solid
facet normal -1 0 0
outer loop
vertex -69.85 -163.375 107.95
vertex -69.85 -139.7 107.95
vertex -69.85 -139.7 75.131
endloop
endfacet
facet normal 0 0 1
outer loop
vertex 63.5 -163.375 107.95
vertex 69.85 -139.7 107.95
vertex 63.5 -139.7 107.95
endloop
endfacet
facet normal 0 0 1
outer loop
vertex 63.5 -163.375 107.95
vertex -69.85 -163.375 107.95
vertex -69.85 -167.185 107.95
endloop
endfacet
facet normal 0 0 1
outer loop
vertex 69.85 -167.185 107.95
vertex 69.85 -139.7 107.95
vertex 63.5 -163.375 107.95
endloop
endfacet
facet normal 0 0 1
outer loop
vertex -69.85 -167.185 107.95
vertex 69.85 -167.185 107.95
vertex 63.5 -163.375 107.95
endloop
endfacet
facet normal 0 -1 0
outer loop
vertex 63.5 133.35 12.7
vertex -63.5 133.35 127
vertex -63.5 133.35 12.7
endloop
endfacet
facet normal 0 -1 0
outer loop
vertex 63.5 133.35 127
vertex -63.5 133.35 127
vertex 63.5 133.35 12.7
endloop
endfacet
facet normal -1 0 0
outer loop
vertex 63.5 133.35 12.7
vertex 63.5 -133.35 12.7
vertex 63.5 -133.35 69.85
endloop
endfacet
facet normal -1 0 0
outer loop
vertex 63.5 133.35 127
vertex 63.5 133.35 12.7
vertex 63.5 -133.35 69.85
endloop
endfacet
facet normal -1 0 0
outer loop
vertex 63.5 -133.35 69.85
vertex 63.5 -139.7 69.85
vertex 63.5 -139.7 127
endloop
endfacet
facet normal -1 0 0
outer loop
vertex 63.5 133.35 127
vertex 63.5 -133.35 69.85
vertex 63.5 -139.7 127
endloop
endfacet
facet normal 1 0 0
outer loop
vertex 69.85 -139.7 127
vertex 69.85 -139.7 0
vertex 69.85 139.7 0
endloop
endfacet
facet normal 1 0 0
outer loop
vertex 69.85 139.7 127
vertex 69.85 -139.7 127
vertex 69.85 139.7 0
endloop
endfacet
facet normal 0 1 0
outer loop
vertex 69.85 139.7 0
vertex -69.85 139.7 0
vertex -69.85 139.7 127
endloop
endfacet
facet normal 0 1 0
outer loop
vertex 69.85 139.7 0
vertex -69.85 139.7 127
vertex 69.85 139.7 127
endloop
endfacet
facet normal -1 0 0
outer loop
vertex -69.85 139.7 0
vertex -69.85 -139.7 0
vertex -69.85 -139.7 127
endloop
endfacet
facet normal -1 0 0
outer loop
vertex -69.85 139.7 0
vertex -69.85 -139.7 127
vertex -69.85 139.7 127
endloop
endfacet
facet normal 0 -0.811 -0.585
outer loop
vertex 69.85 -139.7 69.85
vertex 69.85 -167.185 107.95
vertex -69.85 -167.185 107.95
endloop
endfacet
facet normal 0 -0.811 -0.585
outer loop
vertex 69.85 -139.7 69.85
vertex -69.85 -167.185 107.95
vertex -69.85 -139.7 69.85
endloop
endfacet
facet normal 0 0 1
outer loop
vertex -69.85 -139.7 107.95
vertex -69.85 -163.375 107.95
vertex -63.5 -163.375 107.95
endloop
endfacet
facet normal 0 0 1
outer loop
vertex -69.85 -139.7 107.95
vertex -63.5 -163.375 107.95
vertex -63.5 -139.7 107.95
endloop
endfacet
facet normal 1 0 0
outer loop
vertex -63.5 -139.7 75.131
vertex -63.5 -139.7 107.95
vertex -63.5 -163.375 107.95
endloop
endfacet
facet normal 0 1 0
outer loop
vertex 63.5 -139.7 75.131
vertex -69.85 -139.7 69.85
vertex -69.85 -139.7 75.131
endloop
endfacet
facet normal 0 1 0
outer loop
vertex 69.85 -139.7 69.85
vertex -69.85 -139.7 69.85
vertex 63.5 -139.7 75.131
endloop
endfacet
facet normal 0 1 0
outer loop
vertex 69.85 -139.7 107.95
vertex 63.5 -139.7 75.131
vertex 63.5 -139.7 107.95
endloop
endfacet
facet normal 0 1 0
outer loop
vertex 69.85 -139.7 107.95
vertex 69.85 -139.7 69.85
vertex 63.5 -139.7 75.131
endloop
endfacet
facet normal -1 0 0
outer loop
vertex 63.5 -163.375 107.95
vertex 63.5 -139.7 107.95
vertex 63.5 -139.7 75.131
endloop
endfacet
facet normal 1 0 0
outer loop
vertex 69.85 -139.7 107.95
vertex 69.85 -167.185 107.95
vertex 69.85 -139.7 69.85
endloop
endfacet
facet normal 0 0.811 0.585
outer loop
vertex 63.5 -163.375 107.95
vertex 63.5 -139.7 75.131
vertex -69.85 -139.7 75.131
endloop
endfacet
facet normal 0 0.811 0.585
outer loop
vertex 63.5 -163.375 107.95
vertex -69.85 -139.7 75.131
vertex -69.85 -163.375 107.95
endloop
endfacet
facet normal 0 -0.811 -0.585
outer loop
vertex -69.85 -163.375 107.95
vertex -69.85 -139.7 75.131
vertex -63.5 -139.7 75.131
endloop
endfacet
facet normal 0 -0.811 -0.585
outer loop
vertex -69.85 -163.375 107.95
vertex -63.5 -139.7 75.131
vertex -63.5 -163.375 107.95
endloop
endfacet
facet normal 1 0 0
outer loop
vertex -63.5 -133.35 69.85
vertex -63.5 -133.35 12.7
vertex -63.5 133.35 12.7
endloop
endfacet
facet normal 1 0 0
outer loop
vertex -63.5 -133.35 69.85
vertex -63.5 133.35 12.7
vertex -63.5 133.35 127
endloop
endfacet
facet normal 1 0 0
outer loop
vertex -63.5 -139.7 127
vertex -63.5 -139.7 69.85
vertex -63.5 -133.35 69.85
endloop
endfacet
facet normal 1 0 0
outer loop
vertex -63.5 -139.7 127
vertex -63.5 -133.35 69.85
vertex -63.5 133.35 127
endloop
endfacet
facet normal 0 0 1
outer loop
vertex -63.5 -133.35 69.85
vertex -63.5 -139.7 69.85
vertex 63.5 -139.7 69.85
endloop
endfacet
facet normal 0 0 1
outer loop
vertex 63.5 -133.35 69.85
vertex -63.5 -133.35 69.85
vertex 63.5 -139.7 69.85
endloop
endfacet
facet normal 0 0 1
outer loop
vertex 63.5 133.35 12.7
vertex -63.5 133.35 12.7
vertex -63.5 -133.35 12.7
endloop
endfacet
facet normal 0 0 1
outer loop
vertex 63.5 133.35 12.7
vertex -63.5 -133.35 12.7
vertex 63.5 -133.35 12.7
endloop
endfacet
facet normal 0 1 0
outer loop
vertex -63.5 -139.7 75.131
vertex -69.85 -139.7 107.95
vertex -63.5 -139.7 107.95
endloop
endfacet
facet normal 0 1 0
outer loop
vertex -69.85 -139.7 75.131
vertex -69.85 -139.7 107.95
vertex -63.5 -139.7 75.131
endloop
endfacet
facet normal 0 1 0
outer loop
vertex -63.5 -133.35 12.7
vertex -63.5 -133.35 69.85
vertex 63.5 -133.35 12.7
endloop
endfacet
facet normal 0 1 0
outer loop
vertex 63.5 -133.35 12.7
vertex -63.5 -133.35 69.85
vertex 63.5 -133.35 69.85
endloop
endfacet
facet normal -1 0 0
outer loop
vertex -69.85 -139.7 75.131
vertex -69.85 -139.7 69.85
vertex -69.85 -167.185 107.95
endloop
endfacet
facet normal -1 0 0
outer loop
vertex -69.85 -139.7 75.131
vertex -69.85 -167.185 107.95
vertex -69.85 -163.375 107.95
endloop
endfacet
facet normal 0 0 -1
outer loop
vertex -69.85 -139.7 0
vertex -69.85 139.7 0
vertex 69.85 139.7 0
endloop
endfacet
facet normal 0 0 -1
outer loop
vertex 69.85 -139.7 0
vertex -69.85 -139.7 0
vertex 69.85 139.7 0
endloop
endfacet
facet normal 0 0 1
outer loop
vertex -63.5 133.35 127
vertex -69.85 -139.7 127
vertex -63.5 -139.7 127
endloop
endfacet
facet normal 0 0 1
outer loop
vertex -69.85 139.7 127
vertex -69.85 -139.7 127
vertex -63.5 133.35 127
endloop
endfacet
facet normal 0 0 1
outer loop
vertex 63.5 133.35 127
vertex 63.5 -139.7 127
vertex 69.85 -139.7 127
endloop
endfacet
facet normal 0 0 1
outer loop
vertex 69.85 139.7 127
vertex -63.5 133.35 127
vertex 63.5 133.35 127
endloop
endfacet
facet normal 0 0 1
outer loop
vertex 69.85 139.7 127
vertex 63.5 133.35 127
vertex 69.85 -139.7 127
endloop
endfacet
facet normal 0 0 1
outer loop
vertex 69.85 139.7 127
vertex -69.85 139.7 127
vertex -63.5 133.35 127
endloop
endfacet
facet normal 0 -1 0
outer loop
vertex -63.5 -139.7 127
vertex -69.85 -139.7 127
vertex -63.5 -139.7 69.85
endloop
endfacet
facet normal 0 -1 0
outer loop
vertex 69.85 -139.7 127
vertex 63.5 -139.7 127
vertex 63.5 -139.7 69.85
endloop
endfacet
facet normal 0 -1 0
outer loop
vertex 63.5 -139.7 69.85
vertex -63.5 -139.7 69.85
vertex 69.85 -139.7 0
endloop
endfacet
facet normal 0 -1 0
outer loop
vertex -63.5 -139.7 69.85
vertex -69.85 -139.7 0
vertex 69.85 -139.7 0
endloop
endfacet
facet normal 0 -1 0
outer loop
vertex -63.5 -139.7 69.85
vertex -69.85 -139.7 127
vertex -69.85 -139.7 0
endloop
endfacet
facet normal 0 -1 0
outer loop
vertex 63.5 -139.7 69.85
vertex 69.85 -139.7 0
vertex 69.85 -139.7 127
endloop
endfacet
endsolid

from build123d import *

# Parameters (mm, degrees)
F0_W      = 139.7
F0_H      = 279.4
F1_DEPTH  = 127
F2_W      = 127
F2_H      = 266.7
F3_DEPTH  = 114.3
F4_W      = 127
F4_H      = 57.15
F5_DEPTH  = 25.4
F7_DEPTH  = 139.7
F9_DEPTH  = 133.35
F11_DEPTH = 6.35
F12_DEPTH = 6.35


with BuildPart() as f1:
    # F0 (on Top) → F1 (new body)
    with BuildSketch(Plane.XY):
        Rectangle(F0_W, F0_H)
    extrude(amount=F1_DEPTH)

    # F2 (on face) → F3 (cut)
    with BuildSketch(Plane.XY.offset(127)):
        Rectangle(F2_W, F2_H)
    extrude(amount=-F3_DEPTH, mode=Mode.SUBTRACT)

    # F4 (on face) → F5 (cut)
    with BuildSketch(Plane.XZ.offset(139.7)):
        with Locations((0, 98.425)):
            Rectangle(F4_W, F4_H)
    extrude(amount=-F5_DEPTH, mode=Mode.SUBTRACT)


with BuildPart() as f7:
    # F6 (on face) → F7 (new body)
    with BuildSketch(Plane.YZ.offset(69.85)):
        Polygon((-139.7, 69.85), (-139.7, 107.95), (-167.185268, 107.95), align=None)
    extrude(amount=-F7_DEPTH)

    # F8 (on face) → F9 (cut)
    with BuildSketch(Plane(origin=(-69.85, 0, 0), x_dir=(0, -1, 0), z_dir=(-1, 0, 0))):
        Polygon((163.375268, 107.95), (139.7, 107.95), (139.7, 75.131411), align=None)
    extrude(amount=-F9_DEPTH, mode=Mode.SUBTRACT)


with BuildPart() as f11:
    # F10 (on face) → F11 (new body)
    with BuildSketch(Plane(origin=(-69.85, 0, 0), x_dir=(0, -1, 0), z_dir=(-1, 0, 0))):
        Polygon((139.7, 75.131411), (163.375268, 107.95), (139.7, 107.95), align=None)
    extrude(amount=-F11_DEPTH)


with BuildPart() as f12:
    # F10 (on face) → F12 (new body)
    with BuildSketch(Plane(origin=(-69.85, 0, 0), x_dir=(0, -1, 0), z_dir=(-1, 0, 0))):
        Polygon((139.7, 75.131411), (163.375268, 107.95), (139.7, 107.95), align=None)
    extrude(amount=-F12_DEPTH)


solid = Compound([f1.part, f7.part, f12.part])
